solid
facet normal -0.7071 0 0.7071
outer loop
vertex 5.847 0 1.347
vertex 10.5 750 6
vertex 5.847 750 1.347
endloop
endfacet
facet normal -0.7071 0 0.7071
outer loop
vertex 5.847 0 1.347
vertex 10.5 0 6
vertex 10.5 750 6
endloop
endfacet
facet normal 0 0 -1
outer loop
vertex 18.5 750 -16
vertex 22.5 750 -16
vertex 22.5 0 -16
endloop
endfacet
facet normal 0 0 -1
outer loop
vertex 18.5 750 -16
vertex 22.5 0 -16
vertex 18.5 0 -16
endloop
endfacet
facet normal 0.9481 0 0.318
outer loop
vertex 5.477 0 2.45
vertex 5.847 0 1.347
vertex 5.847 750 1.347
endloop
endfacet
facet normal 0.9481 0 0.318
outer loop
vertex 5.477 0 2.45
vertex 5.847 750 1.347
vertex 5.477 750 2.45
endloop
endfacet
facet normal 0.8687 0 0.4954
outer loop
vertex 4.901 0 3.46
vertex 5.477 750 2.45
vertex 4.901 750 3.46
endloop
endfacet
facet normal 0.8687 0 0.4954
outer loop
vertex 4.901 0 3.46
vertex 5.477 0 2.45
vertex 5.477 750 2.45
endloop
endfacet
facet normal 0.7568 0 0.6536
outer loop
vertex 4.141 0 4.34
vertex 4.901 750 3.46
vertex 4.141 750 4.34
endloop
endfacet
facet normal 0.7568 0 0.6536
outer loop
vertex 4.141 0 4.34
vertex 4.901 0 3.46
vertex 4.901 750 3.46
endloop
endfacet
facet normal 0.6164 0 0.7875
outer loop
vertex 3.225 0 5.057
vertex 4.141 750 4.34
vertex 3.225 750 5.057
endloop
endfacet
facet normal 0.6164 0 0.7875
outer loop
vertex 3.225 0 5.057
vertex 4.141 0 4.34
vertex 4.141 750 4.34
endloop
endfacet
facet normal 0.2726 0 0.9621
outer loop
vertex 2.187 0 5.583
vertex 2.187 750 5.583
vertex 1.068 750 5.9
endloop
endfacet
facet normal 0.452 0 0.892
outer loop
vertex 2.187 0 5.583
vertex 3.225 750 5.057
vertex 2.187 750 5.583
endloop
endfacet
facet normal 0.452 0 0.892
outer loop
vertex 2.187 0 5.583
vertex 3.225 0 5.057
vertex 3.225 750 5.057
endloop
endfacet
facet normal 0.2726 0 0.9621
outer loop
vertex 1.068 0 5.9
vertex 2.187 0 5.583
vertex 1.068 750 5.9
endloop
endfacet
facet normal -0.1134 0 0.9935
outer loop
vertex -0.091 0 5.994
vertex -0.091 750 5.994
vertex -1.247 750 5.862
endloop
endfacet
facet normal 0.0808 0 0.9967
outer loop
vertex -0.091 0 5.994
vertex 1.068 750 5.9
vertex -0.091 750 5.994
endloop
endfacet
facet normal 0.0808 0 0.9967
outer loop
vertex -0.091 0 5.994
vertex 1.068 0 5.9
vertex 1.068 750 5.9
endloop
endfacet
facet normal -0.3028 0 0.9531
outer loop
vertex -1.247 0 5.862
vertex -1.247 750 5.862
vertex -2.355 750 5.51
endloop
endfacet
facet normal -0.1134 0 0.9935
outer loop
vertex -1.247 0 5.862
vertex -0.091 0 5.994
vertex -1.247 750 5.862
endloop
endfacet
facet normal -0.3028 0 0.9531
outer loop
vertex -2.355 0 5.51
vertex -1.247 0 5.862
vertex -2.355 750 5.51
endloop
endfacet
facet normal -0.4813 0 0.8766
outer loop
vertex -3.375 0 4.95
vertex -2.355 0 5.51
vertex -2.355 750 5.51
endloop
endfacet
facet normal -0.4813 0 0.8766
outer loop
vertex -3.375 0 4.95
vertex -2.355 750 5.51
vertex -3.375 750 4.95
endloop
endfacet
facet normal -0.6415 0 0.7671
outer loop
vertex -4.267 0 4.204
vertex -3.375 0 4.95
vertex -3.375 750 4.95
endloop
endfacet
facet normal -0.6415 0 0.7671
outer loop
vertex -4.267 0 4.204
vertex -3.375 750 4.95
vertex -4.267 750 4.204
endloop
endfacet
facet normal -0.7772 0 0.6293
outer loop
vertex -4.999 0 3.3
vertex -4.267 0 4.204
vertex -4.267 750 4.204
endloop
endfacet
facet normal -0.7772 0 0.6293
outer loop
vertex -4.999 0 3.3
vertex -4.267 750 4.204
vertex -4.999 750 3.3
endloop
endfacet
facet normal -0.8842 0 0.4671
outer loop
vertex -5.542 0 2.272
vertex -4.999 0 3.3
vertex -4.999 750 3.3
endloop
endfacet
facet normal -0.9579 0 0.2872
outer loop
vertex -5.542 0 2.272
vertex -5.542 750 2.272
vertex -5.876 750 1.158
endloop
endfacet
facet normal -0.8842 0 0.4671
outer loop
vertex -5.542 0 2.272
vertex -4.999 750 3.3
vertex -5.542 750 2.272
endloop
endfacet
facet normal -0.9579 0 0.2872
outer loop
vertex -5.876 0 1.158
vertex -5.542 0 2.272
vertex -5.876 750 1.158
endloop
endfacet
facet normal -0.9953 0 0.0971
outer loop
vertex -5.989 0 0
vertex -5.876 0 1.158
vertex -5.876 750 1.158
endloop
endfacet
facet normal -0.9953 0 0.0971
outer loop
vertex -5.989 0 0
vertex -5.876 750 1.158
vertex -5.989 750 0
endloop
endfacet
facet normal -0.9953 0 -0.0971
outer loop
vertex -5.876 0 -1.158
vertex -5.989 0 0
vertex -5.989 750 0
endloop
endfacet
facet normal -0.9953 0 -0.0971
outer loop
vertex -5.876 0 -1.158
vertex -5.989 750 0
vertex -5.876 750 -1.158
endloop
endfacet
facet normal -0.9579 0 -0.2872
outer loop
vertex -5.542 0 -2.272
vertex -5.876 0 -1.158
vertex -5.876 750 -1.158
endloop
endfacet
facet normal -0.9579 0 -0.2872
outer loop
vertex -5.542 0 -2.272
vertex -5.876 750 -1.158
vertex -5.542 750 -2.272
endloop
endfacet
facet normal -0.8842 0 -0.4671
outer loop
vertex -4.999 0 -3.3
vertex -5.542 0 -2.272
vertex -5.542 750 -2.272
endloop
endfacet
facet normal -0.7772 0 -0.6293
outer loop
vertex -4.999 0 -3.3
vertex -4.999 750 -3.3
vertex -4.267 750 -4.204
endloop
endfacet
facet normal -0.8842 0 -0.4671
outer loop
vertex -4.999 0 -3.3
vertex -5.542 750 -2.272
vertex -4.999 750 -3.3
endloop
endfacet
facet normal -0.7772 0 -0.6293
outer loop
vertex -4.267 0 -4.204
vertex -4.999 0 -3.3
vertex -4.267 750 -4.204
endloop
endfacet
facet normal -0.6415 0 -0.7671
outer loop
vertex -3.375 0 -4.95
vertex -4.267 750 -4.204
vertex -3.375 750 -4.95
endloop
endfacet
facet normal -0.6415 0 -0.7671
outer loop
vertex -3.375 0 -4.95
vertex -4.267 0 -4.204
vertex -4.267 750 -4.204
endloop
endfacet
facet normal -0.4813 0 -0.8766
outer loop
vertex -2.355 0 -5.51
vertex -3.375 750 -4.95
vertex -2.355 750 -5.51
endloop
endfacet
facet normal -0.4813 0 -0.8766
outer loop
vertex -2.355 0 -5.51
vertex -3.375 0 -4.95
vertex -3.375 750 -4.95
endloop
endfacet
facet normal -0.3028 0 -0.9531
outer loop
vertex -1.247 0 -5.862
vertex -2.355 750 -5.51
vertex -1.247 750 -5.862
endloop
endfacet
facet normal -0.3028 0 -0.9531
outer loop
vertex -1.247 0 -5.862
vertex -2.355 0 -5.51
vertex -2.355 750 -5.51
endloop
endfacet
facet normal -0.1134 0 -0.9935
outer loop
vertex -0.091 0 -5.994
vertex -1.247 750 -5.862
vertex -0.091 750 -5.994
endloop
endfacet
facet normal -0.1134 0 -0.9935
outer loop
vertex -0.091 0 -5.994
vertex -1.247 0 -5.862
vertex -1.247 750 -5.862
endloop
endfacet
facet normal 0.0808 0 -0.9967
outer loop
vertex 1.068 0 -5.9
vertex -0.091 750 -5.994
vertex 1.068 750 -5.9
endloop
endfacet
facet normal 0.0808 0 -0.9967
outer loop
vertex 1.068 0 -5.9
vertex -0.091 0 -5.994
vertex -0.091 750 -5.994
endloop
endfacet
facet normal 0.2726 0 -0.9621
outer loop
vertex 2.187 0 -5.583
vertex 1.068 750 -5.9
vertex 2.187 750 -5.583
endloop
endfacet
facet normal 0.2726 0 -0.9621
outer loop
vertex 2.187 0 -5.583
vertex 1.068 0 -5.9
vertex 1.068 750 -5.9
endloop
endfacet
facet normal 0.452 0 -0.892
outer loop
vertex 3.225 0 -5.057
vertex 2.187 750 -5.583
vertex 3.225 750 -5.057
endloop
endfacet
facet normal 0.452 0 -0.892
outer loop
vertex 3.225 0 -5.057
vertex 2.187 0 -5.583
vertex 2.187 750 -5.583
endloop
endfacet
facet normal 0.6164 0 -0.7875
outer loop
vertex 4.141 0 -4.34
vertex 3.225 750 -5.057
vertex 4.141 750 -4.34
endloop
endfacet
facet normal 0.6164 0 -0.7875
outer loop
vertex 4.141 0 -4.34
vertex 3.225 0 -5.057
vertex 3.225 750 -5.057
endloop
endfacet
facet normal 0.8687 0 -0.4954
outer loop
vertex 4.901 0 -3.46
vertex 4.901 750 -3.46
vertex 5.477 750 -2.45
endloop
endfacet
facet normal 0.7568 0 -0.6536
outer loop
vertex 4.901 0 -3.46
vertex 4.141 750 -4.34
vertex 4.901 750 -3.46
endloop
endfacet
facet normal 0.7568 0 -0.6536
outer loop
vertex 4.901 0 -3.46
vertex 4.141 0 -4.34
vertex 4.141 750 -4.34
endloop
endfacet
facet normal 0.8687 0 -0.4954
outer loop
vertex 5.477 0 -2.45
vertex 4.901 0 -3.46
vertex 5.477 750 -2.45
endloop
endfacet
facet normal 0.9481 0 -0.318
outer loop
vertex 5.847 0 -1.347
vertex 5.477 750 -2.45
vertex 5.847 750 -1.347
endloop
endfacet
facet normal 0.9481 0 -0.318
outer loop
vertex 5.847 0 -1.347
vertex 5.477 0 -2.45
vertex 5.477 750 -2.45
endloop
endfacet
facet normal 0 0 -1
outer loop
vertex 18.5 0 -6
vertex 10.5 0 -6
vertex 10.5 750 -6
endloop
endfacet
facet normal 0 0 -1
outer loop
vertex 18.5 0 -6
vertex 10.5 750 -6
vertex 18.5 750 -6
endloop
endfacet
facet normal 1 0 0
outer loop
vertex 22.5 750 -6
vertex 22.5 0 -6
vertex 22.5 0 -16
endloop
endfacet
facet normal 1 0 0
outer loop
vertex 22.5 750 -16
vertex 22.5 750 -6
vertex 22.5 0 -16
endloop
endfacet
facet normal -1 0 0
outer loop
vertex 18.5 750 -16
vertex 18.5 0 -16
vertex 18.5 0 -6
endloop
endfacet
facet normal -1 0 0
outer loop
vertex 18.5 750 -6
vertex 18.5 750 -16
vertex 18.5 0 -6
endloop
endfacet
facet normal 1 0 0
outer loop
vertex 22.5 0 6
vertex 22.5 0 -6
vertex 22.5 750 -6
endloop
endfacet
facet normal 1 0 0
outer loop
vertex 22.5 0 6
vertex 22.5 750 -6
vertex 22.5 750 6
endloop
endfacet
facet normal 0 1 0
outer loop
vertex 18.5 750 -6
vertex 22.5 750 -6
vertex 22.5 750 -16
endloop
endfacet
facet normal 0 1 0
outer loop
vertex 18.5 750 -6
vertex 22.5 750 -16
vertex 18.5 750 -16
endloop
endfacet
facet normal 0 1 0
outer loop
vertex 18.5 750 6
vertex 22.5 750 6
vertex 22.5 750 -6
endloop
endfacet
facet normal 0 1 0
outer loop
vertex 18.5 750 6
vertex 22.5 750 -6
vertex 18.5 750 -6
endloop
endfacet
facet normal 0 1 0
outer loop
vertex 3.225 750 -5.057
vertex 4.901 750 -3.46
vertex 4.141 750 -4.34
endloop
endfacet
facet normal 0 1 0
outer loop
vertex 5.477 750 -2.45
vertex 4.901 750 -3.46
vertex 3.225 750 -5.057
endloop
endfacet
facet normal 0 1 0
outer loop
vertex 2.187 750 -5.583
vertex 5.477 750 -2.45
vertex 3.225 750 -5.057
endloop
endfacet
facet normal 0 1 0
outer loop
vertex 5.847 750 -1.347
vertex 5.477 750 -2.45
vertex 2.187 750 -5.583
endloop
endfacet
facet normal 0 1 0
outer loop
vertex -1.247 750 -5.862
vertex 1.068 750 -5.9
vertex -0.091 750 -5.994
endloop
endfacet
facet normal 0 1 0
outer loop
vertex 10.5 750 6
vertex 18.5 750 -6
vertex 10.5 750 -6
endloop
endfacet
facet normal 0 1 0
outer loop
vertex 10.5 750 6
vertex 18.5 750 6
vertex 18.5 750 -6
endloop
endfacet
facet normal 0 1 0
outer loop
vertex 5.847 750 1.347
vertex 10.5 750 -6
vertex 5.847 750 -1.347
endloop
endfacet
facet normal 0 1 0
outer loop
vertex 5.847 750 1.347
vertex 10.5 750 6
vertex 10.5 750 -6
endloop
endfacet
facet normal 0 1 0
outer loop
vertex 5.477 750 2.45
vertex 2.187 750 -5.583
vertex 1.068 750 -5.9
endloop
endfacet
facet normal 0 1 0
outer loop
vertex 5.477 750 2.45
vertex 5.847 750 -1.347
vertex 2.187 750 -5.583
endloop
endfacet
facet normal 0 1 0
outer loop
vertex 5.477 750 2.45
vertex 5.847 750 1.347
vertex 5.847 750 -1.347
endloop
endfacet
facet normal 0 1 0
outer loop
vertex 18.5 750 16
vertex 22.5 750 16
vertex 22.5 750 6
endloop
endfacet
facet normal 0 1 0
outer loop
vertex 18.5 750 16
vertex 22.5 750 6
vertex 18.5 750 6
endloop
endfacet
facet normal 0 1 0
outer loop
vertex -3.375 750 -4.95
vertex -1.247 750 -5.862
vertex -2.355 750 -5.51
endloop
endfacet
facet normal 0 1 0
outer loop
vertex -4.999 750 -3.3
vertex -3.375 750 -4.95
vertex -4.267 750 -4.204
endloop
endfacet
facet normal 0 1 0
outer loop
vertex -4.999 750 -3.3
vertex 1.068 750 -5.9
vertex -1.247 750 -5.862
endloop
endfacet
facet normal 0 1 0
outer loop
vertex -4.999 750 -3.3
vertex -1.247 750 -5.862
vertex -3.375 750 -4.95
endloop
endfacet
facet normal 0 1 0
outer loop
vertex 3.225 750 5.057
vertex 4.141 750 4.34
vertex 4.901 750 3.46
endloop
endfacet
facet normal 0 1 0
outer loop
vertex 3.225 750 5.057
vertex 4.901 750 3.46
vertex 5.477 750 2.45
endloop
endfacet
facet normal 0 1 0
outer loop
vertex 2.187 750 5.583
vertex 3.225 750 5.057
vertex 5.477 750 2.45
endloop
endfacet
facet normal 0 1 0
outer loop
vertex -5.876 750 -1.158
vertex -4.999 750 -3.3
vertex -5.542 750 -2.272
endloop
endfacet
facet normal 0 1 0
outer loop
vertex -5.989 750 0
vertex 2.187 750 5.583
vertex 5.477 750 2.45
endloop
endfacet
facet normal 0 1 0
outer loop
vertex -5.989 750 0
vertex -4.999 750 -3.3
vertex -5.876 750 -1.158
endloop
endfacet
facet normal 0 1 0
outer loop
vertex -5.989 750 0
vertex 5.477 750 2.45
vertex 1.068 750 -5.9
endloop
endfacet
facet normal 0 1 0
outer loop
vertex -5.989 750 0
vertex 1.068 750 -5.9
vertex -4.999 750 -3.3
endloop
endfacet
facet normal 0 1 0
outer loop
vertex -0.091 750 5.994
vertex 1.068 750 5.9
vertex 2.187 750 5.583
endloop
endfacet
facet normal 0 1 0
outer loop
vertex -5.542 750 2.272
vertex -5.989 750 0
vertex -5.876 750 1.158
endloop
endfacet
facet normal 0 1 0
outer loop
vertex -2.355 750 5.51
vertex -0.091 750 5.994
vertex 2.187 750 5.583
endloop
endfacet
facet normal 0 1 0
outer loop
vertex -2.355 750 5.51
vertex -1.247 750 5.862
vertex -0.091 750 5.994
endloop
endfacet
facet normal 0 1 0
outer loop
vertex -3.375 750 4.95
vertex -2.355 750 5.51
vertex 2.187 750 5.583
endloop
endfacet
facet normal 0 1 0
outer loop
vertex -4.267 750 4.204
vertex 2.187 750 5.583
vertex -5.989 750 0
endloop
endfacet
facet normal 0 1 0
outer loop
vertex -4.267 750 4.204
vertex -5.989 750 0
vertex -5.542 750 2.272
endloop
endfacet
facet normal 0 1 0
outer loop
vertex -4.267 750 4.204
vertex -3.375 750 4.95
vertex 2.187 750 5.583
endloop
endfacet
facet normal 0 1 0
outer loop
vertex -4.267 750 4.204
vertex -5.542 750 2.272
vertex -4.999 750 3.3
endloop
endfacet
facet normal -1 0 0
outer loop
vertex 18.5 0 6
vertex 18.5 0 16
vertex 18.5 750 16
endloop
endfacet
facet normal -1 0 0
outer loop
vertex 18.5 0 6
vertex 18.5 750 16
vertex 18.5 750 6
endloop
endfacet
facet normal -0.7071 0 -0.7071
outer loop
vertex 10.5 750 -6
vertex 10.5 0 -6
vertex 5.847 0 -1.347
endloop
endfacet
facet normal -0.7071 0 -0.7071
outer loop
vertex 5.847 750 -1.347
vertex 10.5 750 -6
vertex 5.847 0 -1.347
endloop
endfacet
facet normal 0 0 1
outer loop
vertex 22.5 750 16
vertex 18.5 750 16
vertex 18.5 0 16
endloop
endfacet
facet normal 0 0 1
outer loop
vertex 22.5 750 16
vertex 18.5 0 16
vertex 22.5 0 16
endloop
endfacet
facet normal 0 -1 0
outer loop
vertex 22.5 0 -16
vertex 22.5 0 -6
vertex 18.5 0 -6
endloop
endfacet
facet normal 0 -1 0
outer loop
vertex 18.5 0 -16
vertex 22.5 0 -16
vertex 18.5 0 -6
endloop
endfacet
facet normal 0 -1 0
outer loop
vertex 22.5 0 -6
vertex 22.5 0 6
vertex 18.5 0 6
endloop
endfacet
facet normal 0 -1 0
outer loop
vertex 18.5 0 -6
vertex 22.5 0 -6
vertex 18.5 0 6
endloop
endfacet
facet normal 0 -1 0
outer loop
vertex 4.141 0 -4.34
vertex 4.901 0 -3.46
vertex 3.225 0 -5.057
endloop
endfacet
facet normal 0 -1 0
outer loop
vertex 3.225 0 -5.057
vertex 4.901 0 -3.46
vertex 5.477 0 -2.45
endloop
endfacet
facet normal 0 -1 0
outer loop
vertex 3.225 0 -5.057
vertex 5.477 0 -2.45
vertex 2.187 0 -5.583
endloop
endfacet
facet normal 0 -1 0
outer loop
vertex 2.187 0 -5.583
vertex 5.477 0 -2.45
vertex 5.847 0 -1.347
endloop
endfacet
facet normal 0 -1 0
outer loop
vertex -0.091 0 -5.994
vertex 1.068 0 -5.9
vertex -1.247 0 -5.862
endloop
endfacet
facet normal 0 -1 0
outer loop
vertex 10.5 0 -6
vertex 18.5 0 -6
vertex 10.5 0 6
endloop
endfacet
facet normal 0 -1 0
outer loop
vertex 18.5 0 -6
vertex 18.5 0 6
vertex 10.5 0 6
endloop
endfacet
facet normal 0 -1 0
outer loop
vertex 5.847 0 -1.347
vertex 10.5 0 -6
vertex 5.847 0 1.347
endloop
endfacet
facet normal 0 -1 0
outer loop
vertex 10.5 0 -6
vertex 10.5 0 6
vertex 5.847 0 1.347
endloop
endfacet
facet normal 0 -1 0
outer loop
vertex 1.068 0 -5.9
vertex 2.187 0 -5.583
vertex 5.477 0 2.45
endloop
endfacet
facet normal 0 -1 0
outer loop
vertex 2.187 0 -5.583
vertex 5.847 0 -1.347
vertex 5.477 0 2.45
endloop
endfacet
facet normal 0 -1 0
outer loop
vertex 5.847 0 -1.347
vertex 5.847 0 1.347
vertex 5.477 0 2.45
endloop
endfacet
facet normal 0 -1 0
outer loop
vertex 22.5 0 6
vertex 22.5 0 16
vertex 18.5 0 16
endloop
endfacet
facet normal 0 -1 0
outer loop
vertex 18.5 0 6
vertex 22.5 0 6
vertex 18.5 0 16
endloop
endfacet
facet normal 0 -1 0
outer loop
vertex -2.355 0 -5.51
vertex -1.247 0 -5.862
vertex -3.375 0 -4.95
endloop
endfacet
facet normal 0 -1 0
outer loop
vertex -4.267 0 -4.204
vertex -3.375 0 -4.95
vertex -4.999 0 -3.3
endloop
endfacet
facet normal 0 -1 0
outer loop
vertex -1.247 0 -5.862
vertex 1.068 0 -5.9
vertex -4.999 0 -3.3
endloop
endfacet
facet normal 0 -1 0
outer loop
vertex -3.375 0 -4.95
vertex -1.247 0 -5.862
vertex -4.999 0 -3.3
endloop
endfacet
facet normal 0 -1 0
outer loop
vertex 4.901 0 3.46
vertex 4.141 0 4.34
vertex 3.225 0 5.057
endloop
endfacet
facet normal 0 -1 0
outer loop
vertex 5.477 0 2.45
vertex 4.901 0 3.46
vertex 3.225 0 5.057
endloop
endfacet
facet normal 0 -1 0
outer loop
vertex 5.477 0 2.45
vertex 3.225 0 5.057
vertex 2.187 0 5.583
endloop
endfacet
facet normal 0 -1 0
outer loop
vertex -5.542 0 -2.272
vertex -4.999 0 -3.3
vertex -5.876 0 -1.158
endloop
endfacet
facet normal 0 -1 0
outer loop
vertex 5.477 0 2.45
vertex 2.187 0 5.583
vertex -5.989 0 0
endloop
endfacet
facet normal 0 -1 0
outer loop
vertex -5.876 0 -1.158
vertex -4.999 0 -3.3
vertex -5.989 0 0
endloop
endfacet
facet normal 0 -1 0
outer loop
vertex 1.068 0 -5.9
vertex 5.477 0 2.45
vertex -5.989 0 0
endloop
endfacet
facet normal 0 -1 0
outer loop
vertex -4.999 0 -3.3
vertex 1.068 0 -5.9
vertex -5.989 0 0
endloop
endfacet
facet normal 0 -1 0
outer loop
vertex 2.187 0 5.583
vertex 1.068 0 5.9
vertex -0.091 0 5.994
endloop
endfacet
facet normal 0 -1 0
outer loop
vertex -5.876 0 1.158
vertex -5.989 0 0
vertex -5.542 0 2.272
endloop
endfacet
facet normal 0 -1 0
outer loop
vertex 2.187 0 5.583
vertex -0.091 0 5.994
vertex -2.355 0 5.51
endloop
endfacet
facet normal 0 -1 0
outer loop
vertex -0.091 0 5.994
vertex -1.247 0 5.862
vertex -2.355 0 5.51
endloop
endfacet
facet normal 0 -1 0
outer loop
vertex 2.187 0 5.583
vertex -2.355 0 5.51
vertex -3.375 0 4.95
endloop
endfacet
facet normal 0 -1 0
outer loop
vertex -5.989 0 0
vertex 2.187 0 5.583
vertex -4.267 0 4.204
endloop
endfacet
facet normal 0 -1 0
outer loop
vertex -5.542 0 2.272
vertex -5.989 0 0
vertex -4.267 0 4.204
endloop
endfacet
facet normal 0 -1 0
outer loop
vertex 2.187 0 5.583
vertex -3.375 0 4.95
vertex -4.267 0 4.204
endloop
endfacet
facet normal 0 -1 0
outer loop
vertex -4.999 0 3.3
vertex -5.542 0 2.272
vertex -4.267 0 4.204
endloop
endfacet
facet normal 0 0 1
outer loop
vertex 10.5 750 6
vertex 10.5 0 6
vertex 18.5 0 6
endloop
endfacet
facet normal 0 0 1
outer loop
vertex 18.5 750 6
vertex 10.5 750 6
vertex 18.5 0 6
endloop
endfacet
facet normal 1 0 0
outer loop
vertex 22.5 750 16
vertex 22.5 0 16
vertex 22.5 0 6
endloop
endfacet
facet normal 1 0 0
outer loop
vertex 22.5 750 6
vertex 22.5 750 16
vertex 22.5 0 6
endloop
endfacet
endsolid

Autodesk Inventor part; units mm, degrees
ref_plane "YZ Plane" through (0, 0, 0) normal (1, 0, 0) x (0, 1, 0)
ref_plane "XZ Plane" through (0, 0, 0) normal (0, 1, 0) x (-1, 0, 0)
ref_plane "XY Plane" through (0, 0, 0) normal (0, 0, 1) x (1, 0, 0)
sketch "Sketch1" plane through (0, 0, 0) normal (0, 1, 0) x (-1, 0, 0)
  line L0 (-22.5, -6) -> (-22.5, 6)
  line L1 (-10.5, -6) -> (-5.8469, -1.3469)
  line L2 (-10.5, -6) -> (-3.9195, -6) construction
  line L3 (-10.5, 6) -> (-5.8469, 1.3469)
  arc A0 (-5.8469, -1.3469) -> (-5.8469, 1.3469) centre (-0.0057, 0) ccw
  line L4 (-22.5, 16) -> (-22.5, -16)
  line L5 (-22.5, -16) -> (-18.5, -16)
  line L6 (-18.5, 16) -> (-22.5, 16)
  line L7 (-18.5, -16) -> (-18.5, -6)
  line L8 (-18.5, 16) -> (-18.5, 6)
  line L9 (-10.5, 6) -> (-18.5, 6)
  line L10 (-10.5, -6) -> (-18.5, -6)
  point P0 (0, 0)
  dimension "d2" = 12
  dimension "d3" = 45
  dimension "d4" = 12
  dimension "d6" = 5.9944
  dimension "d7" = 32
  dimension "d8" = 4
  dimension "d10" = 0
extrude "Extrusion1" add sketch "Sketch1" along normal blind 750
properties part number "supportedRail_SBR12_750mm"
